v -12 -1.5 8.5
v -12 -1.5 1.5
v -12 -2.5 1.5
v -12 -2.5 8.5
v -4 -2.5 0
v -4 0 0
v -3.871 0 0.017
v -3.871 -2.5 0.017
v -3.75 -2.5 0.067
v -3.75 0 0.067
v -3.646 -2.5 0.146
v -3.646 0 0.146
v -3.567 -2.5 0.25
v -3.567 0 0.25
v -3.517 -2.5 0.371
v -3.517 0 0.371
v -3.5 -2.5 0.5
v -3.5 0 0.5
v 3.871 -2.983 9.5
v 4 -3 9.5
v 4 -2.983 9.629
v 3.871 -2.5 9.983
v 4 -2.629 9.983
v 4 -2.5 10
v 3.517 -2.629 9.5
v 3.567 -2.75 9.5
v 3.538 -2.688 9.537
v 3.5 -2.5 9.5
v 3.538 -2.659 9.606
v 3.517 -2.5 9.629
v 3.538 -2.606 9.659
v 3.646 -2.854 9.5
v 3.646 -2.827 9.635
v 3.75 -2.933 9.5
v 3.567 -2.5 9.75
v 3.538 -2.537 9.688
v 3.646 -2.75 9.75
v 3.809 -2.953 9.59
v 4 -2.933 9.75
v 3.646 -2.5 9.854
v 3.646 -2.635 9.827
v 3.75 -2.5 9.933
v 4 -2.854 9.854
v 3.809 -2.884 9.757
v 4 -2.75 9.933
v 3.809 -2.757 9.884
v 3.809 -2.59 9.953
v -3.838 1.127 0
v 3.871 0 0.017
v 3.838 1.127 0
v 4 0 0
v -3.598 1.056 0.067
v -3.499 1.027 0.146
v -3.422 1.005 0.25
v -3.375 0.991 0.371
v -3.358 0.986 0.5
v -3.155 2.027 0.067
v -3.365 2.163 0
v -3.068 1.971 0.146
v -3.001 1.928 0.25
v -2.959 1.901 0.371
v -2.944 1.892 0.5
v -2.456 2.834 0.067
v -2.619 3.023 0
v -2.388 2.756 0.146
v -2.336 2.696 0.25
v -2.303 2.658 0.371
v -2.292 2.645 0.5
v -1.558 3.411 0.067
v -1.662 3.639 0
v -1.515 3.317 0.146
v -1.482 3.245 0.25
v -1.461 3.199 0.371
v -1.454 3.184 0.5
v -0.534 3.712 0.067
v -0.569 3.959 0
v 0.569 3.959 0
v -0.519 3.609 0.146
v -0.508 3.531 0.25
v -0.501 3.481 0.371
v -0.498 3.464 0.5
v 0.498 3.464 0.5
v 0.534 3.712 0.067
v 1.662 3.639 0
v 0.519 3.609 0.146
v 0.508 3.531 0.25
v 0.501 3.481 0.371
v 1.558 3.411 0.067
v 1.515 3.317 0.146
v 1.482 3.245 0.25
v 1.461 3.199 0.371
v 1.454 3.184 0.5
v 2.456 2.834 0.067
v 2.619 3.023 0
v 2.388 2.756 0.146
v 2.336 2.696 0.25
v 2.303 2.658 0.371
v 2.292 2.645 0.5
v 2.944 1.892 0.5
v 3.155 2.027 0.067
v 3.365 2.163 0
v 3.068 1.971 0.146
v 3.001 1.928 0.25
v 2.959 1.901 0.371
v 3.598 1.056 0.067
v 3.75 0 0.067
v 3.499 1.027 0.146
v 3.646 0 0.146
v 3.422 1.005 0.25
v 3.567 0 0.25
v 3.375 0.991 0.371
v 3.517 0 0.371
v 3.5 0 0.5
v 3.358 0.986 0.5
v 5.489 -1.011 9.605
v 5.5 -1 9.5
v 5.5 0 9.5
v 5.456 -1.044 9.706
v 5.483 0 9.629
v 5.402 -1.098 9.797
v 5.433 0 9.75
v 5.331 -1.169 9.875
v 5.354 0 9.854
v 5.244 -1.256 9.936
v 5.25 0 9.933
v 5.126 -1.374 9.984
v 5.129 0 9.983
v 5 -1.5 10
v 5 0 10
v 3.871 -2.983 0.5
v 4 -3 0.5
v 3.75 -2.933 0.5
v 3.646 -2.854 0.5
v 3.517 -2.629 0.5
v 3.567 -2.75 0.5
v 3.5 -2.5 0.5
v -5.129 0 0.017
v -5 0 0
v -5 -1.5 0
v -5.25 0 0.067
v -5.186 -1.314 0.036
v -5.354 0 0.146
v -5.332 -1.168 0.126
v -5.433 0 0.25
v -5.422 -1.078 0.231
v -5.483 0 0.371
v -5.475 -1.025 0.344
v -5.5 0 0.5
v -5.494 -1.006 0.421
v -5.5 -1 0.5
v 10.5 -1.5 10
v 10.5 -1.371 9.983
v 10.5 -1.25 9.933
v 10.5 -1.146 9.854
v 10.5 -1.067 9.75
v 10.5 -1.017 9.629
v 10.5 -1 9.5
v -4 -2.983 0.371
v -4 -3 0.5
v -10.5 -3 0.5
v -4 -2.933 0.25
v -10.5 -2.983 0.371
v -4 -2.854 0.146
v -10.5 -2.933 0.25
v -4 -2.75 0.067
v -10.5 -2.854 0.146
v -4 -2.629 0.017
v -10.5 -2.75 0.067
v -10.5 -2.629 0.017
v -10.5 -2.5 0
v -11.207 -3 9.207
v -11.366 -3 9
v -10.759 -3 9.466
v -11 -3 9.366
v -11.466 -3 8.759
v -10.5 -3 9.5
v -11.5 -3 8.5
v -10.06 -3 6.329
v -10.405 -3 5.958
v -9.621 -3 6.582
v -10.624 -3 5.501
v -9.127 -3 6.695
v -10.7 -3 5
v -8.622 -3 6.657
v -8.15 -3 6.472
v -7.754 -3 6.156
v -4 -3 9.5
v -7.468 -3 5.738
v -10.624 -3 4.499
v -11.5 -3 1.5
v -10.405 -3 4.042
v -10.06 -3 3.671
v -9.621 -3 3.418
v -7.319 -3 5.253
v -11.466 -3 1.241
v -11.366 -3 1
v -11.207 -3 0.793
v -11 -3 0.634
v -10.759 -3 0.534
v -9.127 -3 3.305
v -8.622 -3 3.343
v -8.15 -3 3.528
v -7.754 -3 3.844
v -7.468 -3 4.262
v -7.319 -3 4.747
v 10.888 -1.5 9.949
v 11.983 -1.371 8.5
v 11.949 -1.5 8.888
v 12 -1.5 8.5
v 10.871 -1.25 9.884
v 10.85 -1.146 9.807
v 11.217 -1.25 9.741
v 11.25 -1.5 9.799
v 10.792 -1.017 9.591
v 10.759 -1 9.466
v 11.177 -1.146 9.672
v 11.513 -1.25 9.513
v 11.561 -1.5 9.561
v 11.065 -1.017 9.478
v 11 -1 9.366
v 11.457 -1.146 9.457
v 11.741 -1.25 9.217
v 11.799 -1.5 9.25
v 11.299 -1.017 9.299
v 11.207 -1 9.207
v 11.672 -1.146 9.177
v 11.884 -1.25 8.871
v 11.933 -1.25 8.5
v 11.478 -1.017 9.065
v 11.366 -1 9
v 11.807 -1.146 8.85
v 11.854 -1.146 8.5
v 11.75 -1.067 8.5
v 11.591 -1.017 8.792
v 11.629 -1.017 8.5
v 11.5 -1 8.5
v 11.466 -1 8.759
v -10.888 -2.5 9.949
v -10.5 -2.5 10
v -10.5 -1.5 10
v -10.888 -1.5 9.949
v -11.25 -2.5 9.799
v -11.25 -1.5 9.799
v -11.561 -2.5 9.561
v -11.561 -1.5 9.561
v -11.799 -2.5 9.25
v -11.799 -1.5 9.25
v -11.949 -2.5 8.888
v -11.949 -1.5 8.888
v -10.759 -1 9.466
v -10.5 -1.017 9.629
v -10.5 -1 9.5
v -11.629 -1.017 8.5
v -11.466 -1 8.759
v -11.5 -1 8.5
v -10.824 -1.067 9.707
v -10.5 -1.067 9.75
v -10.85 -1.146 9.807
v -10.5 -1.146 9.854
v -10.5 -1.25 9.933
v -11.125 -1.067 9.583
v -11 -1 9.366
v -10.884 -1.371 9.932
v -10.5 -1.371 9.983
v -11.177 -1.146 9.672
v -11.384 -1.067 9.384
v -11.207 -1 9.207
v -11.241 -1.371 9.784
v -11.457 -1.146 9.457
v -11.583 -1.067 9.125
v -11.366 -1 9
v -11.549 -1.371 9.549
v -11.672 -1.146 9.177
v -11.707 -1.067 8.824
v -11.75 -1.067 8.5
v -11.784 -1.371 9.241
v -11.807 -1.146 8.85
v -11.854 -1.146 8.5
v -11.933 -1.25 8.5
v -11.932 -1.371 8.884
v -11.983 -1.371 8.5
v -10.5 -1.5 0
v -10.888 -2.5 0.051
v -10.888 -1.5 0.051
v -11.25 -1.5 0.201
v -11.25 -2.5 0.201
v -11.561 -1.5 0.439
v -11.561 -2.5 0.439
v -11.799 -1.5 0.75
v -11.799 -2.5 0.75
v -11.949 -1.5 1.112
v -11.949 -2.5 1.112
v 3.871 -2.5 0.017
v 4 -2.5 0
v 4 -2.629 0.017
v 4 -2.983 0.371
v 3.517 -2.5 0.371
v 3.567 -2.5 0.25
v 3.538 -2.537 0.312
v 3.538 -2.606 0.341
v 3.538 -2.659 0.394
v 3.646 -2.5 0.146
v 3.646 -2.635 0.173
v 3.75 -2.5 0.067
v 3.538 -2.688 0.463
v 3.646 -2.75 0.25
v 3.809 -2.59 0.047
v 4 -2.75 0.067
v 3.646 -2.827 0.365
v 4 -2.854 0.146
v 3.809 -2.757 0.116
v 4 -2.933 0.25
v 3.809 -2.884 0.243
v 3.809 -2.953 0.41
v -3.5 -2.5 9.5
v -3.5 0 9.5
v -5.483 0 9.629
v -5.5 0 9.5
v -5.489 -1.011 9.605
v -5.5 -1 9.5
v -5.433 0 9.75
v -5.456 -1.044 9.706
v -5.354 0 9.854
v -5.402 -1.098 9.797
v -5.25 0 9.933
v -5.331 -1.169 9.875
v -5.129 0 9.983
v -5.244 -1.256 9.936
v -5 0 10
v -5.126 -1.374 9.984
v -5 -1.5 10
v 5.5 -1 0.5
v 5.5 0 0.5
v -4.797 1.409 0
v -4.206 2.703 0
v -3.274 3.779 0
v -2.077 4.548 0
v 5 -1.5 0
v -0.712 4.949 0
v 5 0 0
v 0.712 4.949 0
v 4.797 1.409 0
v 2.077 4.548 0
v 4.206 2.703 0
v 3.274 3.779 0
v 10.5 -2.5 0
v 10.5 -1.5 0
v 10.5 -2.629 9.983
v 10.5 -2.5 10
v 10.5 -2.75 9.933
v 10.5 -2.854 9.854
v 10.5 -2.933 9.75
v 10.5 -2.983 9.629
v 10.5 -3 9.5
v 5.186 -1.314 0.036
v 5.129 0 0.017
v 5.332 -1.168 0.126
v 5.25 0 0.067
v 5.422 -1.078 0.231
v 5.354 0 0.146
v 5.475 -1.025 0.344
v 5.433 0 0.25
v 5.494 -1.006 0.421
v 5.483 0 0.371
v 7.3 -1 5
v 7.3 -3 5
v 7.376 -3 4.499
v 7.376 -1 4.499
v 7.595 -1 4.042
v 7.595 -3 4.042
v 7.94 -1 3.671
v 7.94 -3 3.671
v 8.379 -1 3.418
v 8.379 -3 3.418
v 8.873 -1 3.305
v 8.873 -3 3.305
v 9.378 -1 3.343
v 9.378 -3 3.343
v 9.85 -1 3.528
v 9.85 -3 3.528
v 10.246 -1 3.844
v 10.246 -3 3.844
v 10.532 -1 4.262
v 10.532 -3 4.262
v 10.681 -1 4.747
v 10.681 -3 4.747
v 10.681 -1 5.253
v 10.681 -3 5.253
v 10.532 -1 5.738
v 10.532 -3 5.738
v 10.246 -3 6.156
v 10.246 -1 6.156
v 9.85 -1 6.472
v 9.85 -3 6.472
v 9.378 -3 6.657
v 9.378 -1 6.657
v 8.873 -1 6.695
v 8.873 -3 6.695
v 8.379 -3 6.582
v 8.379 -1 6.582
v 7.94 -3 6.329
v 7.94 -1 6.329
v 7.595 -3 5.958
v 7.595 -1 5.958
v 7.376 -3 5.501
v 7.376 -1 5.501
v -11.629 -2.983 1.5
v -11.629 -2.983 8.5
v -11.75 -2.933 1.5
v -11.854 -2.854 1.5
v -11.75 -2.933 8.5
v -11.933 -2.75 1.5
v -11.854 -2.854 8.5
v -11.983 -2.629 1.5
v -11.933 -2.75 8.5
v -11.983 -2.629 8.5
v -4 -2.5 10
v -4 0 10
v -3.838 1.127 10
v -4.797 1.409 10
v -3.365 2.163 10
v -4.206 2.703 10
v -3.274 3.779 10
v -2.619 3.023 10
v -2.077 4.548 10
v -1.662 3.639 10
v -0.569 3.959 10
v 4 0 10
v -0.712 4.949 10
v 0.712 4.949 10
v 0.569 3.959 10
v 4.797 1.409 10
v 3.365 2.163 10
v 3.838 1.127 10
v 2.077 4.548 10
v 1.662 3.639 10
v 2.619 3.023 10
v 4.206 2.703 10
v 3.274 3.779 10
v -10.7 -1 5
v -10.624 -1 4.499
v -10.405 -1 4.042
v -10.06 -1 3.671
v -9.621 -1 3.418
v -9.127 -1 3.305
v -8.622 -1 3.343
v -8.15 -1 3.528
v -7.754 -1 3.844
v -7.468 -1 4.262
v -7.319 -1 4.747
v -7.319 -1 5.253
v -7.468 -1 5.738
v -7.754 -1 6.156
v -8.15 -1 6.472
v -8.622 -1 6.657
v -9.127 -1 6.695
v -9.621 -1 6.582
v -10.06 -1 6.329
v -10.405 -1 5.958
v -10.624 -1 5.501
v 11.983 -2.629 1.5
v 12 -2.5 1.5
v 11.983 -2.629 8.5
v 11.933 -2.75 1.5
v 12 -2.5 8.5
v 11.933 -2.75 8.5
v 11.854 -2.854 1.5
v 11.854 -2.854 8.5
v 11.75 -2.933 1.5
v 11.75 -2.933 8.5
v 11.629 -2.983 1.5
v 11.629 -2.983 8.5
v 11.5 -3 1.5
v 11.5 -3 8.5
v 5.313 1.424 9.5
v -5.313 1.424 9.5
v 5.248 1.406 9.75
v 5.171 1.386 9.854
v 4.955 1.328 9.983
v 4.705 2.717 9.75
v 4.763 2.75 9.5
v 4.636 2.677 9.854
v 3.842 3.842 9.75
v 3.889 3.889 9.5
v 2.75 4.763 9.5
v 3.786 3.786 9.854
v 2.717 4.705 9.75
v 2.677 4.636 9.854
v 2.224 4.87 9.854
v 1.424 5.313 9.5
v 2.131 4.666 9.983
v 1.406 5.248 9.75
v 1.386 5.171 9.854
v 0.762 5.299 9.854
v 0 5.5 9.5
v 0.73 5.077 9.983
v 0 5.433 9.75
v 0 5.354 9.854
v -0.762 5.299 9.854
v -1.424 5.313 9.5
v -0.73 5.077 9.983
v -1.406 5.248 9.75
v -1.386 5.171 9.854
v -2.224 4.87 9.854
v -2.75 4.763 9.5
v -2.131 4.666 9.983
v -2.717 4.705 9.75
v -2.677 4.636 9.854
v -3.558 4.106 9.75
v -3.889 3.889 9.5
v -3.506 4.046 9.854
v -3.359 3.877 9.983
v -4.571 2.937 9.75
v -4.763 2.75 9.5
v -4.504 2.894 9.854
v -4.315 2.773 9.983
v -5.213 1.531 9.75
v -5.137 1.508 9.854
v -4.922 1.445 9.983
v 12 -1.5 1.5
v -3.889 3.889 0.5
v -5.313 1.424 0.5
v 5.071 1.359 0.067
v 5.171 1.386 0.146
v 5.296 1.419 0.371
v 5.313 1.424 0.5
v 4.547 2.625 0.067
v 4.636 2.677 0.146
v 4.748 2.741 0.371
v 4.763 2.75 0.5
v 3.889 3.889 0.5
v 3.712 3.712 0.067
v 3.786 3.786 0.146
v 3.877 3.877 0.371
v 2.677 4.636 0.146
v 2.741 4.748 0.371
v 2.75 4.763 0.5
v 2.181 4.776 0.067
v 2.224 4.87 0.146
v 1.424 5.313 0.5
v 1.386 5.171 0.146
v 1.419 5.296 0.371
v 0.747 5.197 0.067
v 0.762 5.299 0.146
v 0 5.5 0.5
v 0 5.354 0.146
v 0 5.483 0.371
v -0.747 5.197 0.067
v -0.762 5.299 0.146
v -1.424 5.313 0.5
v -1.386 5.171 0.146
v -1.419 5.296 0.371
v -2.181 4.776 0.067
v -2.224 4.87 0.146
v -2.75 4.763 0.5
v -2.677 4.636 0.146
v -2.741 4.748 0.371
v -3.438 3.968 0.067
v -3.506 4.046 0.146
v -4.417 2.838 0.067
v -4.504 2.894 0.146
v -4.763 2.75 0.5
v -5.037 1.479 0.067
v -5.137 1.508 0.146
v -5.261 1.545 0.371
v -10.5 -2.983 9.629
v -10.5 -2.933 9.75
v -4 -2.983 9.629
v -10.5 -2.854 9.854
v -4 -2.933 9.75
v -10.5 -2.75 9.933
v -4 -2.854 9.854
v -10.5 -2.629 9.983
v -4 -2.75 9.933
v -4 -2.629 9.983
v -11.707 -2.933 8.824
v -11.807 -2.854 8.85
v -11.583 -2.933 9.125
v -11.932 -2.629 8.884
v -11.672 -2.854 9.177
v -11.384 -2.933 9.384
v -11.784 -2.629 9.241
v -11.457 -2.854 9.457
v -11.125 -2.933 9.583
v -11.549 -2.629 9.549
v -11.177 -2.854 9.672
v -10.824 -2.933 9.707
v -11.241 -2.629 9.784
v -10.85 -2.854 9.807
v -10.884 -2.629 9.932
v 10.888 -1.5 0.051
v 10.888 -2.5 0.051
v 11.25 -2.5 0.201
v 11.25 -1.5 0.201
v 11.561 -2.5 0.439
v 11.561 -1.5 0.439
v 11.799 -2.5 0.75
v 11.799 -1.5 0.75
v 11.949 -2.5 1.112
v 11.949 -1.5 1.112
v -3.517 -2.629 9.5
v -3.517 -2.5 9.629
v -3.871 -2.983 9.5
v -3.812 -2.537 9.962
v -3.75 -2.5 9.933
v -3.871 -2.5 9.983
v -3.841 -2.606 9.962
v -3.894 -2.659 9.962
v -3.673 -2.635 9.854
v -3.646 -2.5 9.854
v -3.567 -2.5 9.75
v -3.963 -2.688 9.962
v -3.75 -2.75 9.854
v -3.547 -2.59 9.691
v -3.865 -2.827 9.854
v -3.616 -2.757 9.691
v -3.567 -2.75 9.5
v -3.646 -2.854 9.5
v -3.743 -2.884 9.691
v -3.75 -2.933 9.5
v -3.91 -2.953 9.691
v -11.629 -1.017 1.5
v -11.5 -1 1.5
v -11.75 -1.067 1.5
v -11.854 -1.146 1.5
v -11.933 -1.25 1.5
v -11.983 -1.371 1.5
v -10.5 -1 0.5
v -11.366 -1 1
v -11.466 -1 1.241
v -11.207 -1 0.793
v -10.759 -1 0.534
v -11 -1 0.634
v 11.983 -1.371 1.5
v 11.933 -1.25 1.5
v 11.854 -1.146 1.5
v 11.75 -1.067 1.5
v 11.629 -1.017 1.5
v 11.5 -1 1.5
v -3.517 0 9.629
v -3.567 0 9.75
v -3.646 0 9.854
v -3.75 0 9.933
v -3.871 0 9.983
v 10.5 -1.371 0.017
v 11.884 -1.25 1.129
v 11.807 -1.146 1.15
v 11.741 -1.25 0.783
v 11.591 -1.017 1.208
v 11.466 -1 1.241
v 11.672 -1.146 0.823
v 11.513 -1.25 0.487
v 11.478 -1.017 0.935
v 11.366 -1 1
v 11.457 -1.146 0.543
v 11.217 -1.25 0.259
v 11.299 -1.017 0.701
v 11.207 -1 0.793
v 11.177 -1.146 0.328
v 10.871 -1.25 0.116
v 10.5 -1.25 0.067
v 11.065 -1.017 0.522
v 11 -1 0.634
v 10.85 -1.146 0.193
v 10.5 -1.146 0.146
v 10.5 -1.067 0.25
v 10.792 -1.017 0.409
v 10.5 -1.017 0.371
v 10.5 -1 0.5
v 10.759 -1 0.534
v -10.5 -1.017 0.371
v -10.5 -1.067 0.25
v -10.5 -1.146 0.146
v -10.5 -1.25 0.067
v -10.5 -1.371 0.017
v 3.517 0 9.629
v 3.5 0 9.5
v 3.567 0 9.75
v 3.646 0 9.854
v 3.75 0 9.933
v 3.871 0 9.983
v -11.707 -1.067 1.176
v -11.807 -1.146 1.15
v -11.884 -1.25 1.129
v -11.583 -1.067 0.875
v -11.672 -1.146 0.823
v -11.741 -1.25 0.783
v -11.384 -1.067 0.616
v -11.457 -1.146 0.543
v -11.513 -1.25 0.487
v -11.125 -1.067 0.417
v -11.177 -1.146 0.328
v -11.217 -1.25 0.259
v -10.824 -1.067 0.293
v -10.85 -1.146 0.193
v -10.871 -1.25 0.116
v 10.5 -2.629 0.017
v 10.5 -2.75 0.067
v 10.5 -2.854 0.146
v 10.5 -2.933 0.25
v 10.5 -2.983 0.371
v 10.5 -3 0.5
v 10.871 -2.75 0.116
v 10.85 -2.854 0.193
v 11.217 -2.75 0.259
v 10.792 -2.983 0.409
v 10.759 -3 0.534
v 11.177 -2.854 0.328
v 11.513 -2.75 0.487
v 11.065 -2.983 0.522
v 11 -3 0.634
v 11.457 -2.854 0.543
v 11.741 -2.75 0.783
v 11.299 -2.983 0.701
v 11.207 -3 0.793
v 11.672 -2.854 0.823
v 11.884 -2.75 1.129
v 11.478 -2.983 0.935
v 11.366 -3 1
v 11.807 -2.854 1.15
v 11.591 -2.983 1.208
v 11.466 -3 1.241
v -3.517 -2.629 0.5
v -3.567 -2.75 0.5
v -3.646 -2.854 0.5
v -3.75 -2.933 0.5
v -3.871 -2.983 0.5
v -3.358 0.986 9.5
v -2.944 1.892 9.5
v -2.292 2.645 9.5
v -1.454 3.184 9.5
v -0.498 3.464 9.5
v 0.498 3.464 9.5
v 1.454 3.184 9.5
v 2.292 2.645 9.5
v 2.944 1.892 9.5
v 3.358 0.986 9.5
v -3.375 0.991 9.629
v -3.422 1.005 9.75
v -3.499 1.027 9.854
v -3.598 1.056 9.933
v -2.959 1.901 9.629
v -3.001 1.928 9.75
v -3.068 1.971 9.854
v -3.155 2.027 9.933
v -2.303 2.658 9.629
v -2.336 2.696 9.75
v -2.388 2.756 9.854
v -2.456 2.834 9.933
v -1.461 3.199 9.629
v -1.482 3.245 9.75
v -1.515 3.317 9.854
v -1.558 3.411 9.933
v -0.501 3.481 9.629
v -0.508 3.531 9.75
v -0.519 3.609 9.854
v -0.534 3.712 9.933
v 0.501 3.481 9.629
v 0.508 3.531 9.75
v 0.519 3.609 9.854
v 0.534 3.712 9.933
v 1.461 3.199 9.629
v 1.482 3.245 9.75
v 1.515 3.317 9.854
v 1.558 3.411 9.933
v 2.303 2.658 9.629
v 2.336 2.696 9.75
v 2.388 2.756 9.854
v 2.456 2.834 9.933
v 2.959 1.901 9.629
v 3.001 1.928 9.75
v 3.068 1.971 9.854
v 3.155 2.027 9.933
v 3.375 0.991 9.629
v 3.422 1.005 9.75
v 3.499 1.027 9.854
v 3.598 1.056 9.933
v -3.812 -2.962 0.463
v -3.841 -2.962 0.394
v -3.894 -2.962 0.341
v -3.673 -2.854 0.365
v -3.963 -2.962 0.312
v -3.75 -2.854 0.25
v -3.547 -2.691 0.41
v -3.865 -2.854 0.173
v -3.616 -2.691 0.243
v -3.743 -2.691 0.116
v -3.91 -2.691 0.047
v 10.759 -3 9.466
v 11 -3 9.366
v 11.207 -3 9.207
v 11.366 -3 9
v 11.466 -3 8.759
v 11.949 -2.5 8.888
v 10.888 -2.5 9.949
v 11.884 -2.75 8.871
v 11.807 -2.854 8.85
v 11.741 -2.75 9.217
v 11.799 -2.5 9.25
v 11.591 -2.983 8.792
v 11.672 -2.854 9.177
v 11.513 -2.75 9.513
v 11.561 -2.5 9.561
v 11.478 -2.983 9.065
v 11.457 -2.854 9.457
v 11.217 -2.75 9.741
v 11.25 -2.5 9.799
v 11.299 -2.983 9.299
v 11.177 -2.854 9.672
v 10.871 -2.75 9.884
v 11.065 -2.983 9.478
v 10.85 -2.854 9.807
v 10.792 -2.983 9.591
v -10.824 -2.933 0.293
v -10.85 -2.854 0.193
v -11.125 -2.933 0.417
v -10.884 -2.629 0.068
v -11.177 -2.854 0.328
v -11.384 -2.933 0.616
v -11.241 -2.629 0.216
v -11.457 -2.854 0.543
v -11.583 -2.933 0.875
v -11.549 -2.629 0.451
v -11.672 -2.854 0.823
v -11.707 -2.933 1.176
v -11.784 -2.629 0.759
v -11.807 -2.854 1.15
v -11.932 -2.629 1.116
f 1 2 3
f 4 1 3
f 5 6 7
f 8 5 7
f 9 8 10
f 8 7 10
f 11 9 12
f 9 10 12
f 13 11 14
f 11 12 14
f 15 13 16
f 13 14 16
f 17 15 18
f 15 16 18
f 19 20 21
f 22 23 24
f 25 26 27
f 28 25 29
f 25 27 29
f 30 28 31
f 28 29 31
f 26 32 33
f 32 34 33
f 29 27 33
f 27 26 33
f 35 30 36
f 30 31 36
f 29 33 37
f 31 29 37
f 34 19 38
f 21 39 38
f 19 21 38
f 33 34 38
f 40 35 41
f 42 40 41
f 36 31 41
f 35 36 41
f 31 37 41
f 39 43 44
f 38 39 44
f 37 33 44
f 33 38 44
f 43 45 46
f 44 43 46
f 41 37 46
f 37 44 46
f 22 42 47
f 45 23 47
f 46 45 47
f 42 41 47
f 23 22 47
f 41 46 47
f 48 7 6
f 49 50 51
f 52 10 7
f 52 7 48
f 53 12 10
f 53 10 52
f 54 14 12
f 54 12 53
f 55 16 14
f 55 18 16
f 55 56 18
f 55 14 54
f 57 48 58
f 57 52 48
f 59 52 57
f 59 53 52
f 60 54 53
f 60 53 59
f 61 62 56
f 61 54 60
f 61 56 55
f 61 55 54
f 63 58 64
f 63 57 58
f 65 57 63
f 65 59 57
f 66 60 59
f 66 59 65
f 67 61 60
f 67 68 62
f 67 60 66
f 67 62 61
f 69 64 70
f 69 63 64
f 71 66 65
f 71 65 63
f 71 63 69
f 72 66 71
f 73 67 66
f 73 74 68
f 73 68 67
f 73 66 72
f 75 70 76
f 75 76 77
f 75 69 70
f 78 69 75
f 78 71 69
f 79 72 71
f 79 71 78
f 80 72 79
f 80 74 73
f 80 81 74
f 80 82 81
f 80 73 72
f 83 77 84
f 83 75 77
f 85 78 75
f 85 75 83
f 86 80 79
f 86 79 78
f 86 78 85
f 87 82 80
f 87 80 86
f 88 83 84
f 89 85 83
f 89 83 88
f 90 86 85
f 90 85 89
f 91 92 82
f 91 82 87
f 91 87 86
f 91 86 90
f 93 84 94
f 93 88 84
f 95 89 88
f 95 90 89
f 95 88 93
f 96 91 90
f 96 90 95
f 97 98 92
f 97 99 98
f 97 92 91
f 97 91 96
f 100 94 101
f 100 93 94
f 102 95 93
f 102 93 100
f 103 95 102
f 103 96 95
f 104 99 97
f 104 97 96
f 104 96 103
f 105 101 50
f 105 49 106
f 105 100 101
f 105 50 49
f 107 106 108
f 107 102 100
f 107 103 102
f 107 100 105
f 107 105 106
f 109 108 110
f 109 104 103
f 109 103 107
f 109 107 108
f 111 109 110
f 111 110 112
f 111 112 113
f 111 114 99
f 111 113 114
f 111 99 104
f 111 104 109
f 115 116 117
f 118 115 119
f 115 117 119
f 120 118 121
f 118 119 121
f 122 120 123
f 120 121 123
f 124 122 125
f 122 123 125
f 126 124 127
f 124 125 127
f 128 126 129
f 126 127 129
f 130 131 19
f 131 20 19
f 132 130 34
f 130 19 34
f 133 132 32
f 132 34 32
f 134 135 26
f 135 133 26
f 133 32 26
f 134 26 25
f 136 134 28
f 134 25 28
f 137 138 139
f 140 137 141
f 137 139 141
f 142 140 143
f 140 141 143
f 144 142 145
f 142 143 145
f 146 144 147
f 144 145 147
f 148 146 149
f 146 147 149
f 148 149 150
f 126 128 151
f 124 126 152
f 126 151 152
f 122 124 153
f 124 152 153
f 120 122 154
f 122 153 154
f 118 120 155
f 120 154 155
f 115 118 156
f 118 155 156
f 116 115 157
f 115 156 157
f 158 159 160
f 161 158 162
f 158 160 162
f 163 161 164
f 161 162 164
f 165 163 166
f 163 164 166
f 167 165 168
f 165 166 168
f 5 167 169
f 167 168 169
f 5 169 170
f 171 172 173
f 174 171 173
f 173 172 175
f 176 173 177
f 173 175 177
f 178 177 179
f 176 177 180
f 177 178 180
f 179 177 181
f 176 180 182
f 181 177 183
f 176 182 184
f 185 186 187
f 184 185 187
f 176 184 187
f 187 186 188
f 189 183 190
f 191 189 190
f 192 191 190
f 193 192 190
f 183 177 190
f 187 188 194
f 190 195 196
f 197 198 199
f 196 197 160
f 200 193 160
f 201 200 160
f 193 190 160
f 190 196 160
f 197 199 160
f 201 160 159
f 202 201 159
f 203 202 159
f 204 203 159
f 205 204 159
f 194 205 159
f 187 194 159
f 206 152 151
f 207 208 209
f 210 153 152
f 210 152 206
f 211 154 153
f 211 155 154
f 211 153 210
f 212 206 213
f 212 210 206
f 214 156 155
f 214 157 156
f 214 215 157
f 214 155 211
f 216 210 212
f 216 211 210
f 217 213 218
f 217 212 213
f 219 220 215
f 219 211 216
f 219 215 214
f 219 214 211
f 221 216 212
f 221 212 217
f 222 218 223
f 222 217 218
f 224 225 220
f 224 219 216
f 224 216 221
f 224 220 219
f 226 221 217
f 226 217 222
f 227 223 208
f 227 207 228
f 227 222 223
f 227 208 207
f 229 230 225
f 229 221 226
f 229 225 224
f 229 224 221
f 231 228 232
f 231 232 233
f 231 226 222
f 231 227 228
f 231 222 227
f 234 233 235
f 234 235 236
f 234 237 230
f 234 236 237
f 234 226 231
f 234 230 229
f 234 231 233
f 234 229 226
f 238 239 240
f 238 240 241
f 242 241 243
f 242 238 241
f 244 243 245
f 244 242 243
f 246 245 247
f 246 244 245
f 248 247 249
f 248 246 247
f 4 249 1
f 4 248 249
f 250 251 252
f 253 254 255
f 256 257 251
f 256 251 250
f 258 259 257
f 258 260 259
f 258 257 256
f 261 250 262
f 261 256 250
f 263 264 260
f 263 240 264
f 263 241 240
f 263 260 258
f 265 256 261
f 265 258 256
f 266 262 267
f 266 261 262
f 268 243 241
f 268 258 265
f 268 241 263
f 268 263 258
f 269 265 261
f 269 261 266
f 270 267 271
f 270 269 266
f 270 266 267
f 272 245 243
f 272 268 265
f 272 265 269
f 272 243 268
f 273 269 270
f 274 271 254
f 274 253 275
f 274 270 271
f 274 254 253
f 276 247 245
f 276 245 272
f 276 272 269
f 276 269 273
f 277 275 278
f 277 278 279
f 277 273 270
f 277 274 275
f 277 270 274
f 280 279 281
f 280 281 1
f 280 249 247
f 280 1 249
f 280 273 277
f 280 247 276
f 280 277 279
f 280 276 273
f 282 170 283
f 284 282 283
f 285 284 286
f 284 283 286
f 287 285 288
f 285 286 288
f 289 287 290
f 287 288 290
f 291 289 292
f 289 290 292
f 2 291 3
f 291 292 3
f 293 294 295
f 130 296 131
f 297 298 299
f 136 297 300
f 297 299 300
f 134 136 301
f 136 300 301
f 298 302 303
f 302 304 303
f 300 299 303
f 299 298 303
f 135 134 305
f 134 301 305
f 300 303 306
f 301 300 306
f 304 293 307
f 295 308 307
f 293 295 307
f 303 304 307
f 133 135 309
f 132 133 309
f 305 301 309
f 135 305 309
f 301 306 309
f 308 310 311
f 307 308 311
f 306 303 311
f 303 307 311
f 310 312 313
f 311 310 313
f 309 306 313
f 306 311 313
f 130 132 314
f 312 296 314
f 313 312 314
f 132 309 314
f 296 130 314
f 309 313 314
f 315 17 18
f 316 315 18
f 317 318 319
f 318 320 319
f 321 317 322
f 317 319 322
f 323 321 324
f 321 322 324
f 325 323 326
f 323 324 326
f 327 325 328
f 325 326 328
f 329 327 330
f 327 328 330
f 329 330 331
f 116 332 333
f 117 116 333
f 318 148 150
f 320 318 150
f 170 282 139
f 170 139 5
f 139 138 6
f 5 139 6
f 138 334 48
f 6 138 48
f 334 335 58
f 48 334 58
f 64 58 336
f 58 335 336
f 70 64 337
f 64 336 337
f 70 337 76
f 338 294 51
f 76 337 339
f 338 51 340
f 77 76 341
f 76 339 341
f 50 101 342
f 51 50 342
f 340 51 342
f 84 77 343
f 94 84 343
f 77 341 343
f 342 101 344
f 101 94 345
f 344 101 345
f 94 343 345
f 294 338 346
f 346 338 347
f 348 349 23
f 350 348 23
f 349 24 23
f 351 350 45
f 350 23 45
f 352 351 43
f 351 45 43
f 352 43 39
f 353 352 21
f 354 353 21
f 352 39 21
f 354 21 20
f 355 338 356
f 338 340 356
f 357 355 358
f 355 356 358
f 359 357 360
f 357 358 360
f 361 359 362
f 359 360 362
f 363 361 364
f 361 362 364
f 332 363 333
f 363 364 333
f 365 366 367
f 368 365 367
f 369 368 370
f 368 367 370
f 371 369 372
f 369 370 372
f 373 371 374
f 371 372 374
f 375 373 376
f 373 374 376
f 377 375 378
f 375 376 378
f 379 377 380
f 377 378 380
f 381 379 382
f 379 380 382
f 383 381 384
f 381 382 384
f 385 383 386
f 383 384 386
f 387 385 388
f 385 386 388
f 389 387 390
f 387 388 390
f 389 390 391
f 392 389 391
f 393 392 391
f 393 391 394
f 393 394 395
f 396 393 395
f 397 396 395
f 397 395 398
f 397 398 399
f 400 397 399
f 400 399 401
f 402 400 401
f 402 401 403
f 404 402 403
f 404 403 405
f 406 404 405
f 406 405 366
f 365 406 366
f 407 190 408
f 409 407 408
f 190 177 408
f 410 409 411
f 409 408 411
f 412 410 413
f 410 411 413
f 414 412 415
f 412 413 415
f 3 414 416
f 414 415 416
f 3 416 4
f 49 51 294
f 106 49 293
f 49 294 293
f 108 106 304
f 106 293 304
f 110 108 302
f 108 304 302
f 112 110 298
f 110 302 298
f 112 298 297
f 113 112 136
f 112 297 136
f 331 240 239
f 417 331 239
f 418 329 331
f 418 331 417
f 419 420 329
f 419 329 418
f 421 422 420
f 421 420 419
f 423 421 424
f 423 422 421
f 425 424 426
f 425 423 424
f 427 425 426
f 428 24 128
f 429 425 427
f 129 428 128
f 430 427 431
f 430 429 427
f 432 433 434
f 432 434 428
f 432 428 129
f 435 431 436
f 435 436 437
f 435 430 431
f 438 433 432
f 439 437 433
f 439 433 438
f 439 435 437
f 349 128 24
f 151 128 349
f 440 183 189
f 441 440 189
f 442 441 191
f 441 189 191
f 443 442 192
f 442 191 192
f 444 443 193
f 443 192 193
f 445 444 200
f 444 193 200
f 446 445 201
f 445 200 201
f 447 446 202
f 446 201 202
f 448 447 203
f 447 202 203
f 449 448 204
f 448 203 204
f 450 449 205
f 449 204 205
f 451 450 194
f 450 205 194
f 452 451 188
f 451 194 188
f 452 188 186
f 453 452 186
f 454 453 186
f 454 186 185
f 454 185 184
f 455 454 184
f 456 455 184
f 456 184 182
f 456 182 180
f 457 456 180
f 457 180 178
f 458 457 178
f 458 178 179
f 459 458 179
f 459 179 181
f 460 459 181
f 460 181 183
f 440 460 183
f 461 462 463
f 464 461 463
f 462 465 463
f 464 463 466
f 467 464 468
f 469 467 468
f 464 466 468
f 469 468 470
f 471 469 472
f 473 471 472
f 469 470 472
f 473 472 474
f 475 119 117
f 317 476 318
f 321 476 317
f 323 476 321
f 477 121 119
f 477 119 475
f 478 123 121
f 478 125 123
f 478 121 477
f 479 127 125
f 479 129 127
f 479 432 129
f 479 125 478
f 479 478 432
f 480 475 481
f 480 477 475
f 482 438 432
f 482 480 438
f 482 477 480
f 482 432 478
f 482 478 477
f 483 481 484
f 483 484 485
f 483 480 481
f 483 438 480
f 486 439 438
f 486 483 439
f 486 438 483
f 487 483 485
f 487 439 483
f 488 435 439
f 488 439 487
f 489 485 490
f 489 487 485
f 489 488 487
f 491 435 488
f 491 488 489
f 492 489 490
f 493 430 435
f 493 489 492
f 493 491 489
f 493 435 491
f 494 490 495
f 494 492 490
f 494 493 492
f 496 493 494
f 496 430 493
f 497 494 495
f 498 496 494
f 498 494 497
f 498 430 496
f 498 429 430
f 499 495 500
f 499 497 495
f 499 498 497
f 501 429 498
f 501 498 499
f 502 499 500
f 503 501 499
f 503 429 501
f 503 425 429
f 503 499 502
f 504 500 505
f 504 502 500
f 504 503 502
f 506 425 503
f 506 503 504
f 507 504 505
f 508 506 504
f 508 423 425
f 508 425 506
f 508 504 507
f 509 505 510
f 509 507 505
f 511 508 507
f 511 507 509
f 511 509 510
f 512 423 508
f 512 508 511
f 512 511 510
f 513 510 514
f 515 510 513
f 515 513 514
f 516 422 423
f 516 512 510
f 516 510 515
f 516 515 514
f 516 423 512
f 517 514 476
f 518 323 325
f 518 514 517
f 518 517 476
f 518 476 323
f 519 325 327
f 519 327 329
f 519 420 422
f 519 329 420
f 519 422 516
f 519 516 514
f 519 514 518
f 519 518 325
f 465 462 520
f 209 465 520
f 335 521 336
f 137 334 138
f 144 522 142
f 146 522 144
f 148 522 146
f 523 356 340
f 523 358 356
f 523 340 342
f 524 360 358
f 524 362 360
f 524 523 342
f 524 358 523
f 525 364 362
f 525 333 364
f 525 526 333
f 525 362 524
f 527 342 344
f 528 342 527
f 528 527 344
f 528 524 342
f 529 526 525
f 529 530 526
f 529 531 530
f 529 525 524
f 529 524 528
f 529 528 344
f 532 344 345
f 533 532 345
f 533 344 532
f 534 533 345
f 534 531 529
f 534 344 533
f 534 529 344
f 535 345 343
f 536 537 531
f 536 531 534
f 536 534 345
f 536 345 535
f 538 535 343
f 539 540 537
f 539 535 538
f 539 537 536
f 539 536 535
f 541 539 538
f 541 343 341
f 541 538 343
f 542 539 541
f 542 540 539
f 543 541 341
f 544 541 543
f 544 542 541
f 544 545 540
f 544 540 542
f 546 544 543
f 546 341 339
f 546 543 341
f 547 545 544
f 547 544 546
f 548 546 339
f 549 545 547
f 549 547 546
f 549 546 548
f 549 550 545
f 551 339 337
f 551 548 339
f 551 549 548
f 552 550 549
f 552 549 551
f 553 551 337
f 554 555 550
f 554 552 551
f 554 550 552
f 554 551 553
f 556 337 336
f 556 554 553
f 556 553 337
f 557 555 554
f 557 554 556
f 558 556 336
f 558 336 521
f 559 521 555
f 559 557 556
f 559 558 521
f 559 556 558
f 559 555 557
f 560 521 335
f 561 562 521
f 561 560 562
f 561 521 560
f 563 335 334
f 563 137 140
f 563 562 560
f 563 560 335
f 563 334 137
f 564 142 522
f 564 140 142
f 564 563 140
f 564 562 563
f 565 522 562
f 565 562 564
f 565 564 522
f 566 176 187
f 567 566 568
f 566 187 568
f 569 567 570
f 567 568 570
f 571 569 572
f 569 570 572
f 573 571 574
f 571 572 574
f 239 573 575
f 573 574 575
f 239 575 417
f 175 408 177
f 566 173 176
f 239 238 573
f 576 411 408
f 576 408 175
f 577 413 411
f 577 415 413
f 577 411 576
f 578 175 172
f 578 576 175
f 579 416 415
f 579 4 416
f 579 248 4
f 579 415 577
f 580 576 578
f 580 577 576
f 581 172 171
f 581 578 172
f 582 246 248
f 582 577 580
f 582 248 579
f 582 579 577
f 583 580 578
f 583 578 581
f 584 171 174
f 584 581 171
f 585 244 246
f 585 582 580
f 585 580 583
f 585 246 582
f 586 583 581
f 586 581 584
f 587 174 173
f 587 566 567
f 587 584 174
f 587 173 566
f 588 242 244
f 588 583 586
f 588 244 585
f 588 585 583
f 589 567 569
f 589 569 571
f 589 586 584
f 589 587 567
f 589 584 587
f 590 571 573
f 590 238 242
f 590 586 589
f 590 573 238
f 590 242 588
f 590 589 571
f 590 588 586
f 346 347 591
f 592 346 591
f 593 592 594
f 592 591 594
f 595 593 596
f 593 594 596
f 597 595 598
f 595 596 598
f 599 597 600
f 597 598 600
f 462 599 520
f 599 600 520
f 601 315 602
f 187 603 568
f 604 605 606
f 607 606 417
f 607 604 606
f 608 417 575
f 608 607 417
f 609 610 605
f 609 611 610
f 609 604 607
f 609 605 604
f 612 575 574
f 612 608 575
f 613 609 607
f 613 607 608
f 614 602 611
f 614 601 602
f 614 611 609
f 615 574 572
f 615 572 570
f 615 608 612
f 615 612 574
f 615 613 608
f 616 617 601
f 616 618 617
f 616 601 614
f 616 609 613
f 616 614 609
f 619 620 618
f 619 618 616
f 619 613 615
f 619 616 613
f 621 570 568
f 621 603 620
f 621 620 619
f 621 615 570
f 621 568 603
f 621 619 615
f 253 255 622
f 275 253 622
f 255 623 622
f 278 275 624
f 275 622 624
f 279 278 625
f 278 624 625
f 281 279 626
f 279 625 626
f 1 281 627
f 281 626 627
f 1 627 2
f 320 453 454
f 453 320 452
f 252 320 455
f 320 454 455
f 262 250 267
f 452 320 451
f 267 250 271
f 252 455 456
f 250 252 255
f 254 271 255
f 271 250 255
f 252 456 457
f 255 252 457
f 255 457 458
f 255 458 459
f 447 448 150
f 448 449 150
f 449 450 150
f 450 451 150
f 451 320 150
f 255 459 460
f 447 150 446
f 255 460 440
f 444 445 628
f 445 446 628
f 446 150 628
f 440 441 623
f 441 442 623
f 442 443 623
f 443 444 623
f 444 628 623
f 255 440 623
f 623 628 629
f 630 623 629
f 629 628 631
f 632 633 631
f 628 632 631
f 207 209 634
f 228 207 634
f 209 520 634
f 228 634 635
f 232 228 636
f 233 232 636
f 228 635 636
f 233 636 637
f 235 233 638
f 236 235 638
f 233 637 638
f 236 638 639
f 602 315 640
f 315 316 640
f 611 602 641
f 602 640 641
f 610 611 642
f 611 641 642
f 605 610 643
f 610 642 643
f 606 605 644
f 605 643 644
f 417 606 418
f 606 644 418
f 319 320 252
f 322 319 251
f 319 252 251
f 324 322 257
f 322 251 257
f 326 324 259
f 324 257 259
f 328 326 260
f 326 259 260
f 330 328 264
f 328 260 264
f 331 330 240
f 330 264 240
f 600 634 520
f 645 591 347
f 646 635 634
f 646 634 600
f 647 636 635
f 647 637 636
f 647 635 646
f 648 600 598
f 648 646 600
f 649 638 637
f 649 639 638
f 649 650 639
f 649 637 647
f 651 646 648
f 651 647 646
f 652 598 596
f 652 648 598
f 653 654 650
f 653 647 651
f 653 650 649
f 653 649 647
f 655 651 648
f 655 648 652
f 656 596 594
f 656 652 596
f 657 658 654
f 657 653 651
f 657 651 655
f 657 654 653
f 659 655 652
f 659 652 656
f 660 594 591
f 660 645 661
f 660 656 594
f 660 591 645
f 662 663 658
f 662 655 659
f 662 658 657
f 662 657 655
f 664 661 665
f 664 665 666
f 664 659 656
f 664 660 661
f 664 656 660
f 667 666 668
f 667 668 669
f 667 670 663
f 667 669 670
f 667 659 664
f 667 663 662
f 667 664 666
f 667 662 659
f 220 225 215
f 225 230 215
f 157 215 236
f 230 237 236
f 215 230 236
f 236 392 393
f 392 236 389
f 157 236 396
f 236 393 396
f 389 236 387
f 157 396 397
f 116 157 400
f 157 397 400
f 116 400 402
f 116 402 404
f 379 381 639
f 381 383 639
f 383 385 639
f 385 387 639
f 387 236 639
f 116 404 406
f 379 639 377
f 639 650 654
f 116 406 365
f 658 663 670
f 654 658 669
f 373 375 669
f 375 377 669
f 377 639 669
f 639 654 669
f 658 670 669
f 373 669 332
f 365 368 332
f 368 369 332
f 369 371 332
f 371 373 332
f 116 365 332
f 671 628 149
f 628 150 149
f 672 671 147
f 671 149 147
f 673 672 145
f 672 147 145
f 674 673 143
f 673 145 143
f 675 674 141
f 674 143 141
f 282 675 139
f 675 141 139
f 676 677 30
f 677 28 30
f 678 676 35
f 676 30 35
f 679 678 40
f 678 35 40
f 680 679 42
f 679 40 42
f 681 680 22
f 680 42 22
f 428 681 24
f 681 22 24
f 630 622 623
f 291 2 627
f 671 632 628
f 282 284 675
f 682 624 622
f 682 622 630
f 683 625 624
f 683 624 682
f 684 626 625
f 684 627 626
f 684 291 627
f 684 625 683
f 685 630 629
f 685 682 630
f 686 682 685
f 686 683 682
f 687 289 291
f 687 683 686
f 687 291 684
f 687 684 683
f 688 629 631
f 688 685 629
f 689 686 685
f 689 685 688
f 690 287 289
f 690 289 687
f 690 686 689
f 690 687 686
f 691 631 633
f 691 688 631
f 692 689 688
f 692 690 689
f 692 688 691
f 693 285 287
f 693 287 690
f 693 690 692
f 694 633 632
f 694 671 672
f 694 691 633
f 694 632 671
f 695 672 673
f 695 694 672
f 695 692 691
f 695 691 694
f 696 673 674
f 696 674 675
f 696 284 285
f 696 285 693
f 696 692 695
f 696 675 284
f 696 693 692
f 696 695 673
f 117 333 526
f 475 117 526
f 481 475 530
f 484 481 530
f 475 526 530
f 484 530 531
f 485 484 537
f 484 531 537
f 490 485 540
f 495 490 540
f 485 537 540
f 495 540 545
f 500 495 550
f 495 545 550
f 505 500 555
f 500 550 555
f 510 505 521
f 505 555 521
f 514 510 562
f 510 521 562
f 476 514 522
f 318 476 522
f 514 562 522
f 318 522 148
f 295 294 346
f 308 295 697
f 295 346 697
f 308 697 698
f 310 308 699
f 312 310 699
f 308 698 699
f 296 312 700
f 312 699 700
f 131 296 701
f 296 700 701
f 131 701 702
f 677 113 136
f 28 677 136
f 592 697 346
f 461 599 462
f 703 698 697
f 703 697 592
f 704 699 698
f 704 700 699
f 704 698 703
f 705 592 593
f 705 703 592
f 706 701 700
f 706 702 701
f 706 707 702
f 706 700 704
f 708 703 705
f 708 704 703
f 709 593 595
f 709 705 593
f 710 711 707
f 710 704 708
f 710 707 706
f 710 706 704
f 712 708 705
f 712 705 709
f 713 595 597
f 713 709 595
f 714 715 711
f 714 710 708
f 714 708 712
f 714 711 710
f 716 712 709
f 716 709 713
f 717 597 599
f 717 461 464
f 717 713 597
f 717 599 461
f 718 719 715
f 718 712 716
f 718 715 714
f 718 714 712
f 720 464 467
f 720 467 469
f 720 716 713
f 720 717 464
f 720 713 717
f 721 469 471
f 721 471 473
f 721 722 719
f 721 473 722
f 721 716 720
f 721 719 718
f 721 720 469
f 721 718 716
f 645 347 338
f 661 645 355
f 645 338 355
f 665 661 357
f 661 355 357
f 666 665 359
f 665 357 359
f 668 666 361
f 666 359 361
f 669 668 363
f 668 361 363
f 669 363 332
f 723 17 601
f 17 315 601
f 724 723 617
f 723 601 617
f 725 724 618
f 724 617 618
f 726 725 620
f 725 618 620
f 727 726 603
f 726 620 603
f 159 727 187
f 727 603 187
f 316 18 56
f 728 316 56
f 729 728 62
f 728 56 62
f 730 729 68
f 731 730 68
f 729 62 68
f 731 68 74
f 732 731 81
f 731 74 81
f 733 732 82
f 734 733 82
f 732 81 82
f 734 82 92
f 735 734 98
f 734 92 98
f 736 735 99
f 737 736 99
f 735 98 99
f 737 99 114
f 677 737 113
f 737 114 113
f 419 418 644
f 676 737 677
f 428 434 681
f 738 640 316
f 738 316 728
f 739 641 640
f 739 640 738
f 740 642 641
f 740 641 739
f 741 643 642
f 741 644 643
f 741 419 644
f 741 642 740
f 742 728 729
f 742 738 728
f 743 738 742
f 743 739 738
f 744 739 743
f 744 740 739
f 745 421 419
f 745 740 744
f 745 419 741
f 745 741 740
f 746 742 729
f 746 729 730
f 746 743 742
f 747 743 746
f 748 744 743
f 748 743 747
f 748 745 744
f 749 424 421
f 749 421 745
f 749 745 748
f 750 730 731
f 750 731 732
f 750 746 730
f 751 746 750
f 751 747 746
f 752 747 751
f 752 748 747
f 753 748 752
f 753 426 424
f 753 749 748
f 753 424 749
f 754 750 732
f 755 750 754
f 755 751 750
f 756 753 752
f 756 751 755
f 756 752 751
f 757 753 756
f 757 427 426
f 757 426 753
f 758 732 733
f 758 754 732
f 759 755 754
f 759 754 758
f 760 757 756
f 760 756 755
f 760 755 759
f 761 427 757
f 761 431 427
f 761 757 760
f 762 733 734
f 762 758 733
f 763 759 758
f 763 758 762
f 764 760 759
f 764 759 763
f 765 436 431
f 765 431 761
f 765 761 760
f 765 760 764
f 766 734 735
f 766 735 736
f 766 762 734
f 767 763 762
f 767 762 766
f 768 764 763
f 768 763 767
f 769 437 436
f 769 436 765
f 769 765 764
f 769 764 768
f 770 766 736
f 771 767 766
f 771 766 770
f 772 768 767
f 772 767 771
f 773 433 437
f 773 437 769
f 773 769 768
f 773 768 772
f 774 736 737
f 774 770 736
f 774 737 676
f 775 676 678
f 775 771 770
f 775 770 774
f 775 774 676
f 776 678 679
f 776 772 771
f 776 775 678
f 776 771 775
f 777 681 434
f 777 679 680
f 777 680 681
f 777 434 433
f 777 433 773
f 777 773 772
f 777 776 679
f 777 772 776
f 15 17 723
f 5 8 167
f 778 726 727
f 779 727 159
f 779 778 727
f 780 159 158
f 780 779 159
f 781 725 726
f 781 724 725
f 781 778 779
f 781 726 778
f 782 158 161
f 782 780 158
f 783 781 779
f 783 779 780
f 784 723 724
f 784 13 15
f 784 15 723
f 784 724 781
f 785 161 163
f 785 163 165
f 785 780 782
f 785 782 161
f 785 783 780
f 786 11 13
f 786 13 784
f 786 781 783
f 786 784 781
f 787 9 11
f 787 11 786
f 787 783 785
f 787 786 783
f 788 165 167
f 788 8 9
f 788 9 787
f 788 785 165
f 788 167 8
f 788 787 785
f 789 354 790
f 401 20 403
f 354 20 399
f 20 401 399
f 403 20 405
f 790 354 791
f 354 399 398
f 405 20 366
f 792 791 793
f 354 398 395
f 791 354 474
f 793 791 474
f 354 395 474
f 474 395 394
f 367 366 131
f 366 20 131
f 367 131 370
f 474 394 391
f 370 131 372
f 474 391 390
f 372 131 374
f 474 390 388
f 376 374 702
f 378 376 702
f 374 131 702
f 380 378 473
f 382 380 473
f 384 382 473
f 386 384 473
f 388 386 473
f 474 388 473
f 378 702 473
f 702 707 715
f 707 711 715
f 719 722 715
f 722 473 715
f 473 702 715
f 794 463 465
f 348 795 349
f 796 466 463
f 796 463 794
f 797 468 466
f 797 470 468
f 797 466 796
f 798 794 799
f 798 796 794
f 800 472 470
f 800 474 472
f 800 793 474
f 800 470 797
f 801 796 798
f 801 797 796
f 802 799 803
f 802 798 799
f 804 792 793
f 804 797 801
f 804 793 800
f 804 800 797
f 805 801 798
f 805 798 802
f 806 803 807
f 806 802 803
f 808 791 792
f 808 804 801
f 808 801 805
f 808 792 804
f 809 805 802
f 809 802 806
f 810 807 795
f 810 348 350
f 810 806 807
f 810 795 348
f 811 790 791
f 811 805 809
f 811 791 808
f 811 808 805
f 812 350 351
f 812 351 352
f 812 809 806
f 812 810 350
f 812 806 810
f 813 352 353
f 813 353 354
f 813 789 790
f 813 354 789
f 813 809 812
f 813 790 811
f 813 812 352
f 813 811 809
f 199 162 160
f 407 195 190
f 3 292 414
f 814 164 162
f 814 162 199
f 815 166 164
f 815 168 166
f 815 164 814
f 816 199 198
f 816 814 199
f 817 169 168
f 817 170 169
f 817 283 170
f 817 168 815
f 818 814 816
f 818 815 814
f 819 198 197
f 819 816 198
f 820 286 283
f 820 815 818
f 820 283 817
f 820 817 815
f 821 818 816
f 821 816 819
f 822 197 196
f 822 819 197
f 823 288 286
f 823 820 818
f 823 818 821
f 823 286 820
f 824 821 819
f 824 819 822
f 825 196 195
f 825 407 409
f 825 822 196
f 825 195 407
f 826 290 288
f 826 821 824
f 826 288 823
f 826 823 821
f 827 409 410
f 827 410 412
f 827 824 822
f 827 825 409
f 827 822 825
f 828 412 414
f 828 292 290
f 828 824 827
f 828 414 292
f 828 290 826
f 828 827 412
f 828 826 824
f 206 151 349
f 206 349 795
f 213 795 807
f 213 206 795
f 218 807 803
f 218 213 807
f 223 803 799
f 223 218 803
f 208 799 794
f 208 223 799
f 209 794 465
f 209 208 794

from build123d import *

# Parameters (mm, degrees)
BOSS_EXTRUDE1_DEPTH  = 10
M3_CLEARANCE_HOLE1_D = 3.4
FILLET1_R            = 1.5
FILLET2_R            = 0.5


with BuildPart() as part:
    # Sketch1 → Boss-Extrude1 (new body)
    with BuildSketch(Plane.XY):
        with BuildLine():
            ThreePointArc((-5.5, 0), (-5.477033779, -0.502096593), (-5.408326913, -1))
            Line((-5.408326913, -1), (-3.5, -1))
            Line((-3.5, -1), (-3.5, 0))
            ThreePointArc((-3.5, 0), (0, 3.5), (3.5, 0))
            Line((3.5, 0), (3.5, -1))
            Line((3.5, -1), (5.408326913, -1))
            ThreePointArc((5.408326913, -1), (5.477033779, -0.502096593), (5.5, 0))
            ThreePointArc((5.5, 0), (0, 5.5), (-5.5, 0))
        make_face()
        with BuildLine():
            Line((5.5, -1), (5.5, 0))
            ThreePointArc((5.5, 0), (5.477033779, -0.502096593), (5.408326913, -1))
            Line((5.408326913, -1), (5.5, -1))
        make_face()
        with BuildLine():
            Line((-5.5, 0), (-5.5, -1))
            Line((-5.5, -1), (-5.408326913, -1))
            ThreePointArc((-5.408326913, -1), (-5.477033779, -0.502096593), (-5.5, 0))
        make_face()
        with BuildLine():
            Line((-5.5, -1), (-12, -1))
            Line((-12, -1), (-12, -3))
            Line((-12, -3), (-4.609772229, -3))
            ThreePointArc((-4.609772229, -3), (-5.107893656, -2.039466204), (-5.408326913, -1))
            Line((-5.408326913, -1), (-5.5, -1))
        make_face()
        with BuildLine():
            Line((-3.5, -1), (-5.408326913, -1))
            ThreePointArc((-5.408326913, -1), (-5.107893656, -2.039466204), (-4.609772229, -3))
            Line((-4.609772229, -3), (-3.5, -3))
            Line((-3.5, -3), (-3.5, -1))
        make_face()
        with BuildLine():
            Line((3.5, -3), (4.609772229, -3))
            ThreePointArc((4.609772229, -3), (5.107893656, -2.039466204), (5.408326913, -1))
            Line((5.408326913, -1), (3.5, -1))
            Line((3.5, -1), (3.5, -3))
        make_face()
        with BuildLine():
            ThreePointArc((5.408326913, -1), (5.107893656, -2.039466204), (4.609772229, -3))
            Line((4.609772229, -3), (12, -3))
            Line((12, -3), (12, -1))
            Line((12, -1), (5.5, -1))
            Line((5.5, -1), (5.408326913, -1))
        make_face()
    extrude(amount=BOSS_EXTRUDE1_DEPTH)

    # M3 Clearance Hole1 (through all)
    with Locations(Plane(origin=(0, -1, 0), x_dir=(1, 0, 0), z_dir=(0, 1, 0))):
        with Locations((9, -5), (-9, -5)):
            Hole(M3_CLEARANCE_HOLE1_D / 2)

    # Fillet1
    fillet1_edges = [part.edges().sort_by_distance(p)[0] for p in [
        (12, -2, 0),
        (-12, -2, 0),
        (-12, -2, 10),
        (12, -2, 10),
    ]]
    fillet(fillet1_edges, radius=FILLET1_R)

    # Fillet2
    fillet2_edges = [part.edges().sort_by_distance(p)[0] for p in [
        (5.5, -0.5, 10),
        (7, -3, 0),
        (0, 5.5, 10),
        (3.5, -1.5, 0),
        (0, 3.5, 0),
        (-3.5, -1.5, 0),
        (-5.5, -0.5, 0),
        (0, 5.5, 0),
        (5.5, -0.5, 0),
        (-5.5, -0.5, 10),
        (8, -1, 0),
        (3.5, -3, 5),
        (-3.5, -3, 5),
        (-3.5, -1.5, 10),
        (0, 3.5, 10),
        (8, -1, 10),
        (3.5, -1.5, 10),
        (12, -1, 5),
        (12, -3, 5),
        (11.560660172, -3, 0.439339828),
        (11.560660172, -3, 9.560660172),
        (7, -3, 10),
        (-8, -1, 10),
        (-7, -3, 10),
        (11.560660172, -1, 0.439339828),
        (11.560660172, -1, 9.560660172),
        (-7, -3, 0),
        (-8, -1, 0),
        (-12, -3, 5),
        (-12, -1, 5),
        (-11.560660172, -3, 9.560660172),
        (-11.560660172, -3, 0.439339828),
        (-11.560660172, -1, 9.560660172),
        (-11.560660172, -1, 0.439339828),
    ]]
    fillet(fillet2_edges, radius=FILLET2_R)


solid = part.part
